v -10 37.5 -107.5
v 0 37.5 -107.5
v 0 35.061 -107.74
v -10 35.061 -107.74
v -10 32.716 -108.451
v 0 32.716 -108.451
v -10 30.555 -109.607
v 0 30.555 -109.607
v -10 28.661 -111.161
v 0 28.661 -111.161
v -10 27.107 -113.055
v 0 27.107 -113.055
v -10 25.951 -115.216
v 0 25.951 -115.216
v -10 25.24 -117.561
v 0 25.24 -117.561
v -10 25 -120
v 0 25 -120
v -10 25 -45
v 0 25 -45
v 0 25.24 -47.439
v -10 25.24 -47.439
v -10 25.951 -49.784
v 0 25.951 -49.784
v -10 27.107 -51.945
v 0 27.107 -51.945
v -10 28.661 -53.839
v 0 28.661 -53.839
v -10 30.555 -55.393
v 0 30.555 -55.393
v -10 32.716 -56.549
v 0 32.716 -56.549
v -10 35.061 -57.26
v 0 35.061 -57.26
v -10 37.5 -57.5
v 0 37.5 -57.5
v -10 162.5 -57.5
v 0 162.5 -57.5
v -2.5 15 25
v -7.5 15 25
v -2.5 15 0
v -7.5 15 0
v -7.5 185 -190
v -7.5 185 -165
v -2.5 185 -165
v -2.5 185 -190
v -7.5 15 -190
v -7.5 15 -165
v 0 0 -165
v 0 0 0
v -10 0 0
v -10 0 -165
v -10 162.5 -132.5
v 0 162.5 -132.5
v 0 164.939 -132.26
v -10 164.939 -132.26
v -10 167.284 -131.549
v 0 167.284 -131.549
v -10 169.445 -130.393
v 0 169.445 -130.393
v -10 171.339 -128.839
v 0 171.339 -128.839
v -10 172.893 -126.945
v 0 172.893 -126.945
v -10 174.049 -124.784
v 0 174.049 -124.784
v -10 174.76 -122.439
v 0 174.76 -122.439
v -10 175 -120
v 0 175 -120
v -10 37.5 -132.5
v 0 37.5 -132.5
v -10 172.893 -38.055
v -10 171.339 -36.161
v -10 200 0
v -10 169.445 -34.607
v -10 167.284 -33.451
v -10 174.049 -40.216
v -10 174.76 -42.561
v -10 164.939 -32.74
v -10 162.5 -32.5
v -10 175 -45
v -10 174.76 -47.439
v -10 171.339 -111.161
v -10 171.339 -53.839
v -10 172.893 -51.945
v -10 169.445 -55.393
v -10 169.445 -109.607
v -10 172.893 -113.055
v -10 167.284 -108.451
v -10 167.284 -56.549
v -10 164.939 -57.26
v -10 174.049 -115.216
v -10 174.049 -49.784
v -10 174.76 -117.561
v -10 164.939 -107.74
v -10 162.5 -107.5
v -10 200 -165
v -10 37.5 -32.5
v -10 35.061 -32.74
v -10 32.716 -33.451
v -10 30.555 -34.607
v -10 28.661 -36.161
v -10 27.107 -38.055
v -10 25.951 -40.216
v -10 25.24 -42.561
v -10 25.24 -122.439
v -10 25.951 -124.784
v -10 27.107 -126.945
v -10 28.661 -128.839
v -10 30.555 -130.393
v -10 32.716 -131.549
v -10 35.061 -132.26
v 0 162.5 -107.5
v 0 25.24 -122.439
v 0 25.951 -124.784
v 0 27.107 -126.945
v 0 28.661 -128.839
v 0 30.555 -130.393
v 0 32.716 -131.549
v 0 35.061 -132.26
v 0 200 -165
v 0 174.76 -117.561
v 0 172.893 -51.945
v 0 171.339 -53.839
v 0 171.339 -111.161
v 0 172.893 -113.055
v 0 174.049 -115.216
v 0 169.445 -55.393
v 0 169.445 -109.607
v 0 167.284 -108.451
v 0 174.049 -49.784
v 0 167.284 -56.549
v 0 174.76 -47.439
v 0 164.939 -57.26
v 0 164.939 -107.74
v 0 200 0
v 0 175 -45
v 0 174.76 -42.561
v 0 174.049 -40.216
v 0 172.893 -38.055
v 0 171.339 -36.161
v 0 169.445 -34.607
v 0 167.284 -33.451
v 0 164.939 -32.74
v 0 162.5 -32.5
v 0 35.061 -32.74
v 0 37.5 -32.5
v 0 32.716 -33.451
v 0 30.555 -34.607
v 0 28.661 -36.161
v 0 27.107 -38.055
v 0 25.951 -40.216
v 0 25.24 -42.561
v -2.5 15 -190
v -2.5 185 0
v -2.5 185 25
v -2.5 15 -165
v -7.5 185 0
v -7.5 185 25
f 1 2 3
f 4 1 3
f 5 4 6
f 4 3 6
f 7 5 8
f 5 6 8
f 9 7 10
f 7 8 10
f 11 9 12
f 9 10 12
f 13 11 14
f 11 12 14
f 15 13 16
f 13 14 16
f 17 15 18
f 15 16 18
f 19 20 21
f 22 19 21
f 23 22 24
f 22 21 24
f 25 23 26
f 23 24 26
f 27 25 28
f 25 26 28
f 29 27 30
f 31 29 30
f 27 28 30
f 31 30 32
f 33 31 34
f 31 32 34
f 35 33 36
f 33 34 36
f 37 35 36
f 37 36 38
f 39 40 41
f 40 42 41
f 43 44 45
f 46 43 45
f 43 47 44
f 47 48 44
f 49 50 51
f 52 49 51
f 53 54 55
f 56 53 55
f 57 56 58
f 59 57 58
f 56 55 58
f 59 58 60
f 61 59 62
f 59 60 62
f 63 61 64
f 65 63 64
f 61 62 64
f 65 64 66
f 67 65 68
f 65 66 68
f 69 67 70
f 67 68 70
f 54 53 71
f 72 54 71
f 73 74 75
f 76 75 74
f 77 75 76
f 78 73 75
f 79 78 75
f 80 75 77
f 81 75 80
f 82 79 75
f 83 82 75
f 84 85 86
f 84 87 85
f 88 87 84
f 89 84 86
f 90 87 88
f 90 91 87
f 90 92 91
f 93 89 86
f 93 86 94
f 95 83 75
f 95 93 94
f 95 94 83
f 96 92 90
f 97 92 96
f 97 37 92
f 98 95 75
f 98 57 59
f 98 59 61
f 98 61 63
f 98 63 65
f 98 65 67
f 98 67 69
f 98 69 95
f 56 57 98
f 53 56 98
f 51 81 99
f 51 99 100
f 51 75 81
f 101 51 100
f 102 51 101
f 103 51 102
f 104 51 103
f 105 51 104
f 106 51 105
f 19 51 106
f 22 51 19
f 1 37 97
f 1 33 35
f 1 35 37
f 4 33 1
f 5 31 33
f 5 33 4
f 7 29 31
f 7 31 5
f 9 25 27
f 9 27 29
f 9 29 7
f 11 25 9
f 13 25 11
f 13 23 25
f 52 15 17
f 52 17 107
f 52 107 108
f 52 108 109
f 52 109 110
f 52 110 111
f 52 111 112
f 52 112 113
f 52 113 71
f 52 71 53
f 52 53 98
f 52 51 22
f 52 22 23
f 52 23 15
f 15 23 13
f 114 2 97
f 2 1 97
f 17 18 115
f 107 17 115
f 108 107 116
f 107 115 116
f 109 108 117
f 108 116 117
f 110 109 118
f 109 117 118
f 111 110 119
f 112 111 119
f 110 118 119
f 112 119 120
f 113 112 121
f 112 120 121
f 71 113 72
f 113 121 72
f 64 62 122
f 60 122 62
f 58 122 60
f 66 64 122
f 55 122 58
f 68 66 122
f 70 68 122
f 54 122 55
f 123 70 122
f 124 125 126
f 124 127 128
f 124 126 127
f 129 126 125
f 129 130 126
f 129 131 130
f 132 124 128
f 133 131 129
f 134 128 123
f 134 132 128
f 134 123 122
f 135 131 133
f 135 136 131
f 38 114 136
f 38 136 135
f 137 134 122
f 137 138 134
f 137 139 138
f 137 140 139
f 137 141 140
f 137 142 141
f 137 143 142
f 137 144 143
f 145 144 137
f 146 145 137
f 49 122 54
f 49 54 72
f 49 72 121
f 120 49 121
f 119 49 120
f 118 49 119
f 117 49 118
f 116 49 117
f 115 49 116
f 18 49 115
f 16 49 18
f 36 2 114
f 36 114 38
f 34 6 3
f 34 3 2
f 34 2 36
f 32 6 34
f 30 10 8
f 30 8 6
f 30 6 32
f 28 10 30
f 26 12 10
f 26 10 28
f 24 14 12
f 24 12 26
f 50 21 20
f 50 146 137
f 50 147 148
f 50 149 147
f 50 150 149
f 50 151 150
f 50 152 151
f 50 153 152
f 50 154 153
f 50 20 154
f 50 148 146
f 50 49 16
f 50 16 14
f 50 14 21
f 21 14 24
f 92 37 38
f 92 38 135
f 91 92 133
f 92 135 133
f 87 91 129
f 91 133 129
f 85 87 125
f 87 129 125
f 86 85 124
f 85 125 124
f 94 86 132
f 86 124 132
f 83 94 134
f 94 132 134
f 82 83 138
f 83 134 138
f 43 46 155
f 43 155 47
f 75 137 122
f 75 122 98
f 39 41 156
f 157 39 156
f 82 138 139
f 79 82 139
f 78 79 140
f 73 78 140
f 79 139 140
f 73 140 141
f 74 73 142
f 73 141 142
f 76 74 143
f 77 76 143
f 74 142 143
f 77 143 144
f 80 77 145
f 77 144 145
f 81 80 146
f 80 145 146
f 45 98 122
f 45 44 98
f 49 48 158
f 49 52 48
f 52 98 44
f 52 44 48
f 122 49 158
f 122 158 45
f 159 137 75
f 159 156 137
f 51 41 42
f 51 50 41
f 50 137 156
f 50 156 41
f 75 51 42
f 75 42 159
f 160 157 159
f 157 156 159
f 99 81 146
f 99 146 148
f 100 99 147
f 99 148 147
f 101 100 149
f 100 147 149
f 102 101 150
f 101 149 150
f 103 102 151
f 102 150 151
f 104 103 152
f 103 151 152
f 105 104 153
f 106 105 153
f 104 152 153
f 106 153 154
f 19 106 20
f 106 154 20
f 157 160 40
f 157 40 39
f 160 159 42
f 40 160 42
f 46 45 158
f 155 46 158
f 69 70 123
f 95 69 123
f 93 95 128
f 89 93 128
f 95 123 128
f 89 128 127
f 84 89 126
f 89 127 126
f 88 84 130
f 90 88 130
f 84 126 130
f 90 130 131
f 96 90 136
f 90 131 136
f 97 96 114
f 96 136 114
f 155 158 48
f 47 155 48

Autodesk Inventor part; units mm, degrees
ref_plane "YZ Plane" through (0, 0, 0) normal (1, 0, 0) x (0, 1, 0)
ref_plane "XZ Plane" through (0, 0, 0) normal (0, 1, 0) x (-1, 0, 0)
ref_plane "XY Plane" through (0, 0, 0) normal (0, 0, 1) x (1, 0, 0)
sketch "Sketch1" plane through (0, 0, 0) normal (0, 1, 0) x (-1, 0, 0)
  line L0 (0, 0) -> (10, 0)
  line L1 (10, 0) -> (10, -165)
  line L2 (10, -165) -> (0, -165)
  line L3 (0, -165) -> (0, 0)
  dimension "d0" = 10
  dimension "d1" = 165
extrude "Extrusion1" add sketch "Sketch1" along normal blind 200
sketch "Sketch2" plane through (-10, 0, 0) normal (0, 0, 1) x (1, 0, 0)
  line L0 (2.5, 15) -> (7.5, 15)
  line L1 (7.5, 15) -> (7.5, 185)
  line L2 (7.5, 185) -> (2.5, 185)
  line L3 (2.5, 185) -> (2.5, 15)
  point P0 (10, 0)
  dimension "d4" = 5
  dimension "d5" = 170
extrude "Extrusion2" add sketch "Sketch2" along normal blind 25
sketch "Sketch3" plane through (0, 0, -165) normal (0, 0, -1) x (-1, 0, 0)
  line L0 (2.5, 15) -> (7.5, 15)
  line L1 (7.5, 15) -> (7.5, 185)
  line L2 (7.5, 185) -> (2.5, 185)
  line L3 (2.5, 185) -> (2.5, 15)
  point P0 (0, 0)
  dimension "d8" = 5
  dimension "d9" = 170
extrude "Extrusion3" add sketch "Sketch3" along normal blind 25
sketch "Sketch4" plane through (-10, 0, -165) normal (-1, 0, 0) x (0, 0, 1)
  line L0 (0, 200) -> (165, 200) projected
  line L1 (82.5, 200) -> (82.5, 0) construction
  line L2 (0, 0) -> (165, 0) projected
  line L3 (107.5, 175) -> (132.5, 175)
  line L4 (132.5, 175) -> (132.5, 25)
  line L5 (132.5, 25) -> (107.5, 25)
  line L6 (107.5, 25) -> (107.5, 175)
  line L7 (57.5, 175) -> (32.5, 175)
  line L8 (32.5, 175) -> (32.5, 25)
  line L9 (32.5, 25) -> (57.5, 25)
  line L10 (57.5, 25) -> (57.5, 175)
  dimension "d12" = 25
  dimension "d13" = 150
  dimension "d14" = 25
  dimension "d15" = 150
extrude "Extrusion4" cut sketch "Sketch4" against normal blind 10
fillet "Fillet1" radius 12.5 8 edges at (-5, 25, -107.5) (-5, 25, -32.5) (-5, 25, -57.5) (-5, 25, -132.5) (-5, 175, -32.5) (-5, 175, -107.5) (-5, 175, -57.5) (-5, 175, -132.5)
properties part number "TSU_MM_Side_Wall"
